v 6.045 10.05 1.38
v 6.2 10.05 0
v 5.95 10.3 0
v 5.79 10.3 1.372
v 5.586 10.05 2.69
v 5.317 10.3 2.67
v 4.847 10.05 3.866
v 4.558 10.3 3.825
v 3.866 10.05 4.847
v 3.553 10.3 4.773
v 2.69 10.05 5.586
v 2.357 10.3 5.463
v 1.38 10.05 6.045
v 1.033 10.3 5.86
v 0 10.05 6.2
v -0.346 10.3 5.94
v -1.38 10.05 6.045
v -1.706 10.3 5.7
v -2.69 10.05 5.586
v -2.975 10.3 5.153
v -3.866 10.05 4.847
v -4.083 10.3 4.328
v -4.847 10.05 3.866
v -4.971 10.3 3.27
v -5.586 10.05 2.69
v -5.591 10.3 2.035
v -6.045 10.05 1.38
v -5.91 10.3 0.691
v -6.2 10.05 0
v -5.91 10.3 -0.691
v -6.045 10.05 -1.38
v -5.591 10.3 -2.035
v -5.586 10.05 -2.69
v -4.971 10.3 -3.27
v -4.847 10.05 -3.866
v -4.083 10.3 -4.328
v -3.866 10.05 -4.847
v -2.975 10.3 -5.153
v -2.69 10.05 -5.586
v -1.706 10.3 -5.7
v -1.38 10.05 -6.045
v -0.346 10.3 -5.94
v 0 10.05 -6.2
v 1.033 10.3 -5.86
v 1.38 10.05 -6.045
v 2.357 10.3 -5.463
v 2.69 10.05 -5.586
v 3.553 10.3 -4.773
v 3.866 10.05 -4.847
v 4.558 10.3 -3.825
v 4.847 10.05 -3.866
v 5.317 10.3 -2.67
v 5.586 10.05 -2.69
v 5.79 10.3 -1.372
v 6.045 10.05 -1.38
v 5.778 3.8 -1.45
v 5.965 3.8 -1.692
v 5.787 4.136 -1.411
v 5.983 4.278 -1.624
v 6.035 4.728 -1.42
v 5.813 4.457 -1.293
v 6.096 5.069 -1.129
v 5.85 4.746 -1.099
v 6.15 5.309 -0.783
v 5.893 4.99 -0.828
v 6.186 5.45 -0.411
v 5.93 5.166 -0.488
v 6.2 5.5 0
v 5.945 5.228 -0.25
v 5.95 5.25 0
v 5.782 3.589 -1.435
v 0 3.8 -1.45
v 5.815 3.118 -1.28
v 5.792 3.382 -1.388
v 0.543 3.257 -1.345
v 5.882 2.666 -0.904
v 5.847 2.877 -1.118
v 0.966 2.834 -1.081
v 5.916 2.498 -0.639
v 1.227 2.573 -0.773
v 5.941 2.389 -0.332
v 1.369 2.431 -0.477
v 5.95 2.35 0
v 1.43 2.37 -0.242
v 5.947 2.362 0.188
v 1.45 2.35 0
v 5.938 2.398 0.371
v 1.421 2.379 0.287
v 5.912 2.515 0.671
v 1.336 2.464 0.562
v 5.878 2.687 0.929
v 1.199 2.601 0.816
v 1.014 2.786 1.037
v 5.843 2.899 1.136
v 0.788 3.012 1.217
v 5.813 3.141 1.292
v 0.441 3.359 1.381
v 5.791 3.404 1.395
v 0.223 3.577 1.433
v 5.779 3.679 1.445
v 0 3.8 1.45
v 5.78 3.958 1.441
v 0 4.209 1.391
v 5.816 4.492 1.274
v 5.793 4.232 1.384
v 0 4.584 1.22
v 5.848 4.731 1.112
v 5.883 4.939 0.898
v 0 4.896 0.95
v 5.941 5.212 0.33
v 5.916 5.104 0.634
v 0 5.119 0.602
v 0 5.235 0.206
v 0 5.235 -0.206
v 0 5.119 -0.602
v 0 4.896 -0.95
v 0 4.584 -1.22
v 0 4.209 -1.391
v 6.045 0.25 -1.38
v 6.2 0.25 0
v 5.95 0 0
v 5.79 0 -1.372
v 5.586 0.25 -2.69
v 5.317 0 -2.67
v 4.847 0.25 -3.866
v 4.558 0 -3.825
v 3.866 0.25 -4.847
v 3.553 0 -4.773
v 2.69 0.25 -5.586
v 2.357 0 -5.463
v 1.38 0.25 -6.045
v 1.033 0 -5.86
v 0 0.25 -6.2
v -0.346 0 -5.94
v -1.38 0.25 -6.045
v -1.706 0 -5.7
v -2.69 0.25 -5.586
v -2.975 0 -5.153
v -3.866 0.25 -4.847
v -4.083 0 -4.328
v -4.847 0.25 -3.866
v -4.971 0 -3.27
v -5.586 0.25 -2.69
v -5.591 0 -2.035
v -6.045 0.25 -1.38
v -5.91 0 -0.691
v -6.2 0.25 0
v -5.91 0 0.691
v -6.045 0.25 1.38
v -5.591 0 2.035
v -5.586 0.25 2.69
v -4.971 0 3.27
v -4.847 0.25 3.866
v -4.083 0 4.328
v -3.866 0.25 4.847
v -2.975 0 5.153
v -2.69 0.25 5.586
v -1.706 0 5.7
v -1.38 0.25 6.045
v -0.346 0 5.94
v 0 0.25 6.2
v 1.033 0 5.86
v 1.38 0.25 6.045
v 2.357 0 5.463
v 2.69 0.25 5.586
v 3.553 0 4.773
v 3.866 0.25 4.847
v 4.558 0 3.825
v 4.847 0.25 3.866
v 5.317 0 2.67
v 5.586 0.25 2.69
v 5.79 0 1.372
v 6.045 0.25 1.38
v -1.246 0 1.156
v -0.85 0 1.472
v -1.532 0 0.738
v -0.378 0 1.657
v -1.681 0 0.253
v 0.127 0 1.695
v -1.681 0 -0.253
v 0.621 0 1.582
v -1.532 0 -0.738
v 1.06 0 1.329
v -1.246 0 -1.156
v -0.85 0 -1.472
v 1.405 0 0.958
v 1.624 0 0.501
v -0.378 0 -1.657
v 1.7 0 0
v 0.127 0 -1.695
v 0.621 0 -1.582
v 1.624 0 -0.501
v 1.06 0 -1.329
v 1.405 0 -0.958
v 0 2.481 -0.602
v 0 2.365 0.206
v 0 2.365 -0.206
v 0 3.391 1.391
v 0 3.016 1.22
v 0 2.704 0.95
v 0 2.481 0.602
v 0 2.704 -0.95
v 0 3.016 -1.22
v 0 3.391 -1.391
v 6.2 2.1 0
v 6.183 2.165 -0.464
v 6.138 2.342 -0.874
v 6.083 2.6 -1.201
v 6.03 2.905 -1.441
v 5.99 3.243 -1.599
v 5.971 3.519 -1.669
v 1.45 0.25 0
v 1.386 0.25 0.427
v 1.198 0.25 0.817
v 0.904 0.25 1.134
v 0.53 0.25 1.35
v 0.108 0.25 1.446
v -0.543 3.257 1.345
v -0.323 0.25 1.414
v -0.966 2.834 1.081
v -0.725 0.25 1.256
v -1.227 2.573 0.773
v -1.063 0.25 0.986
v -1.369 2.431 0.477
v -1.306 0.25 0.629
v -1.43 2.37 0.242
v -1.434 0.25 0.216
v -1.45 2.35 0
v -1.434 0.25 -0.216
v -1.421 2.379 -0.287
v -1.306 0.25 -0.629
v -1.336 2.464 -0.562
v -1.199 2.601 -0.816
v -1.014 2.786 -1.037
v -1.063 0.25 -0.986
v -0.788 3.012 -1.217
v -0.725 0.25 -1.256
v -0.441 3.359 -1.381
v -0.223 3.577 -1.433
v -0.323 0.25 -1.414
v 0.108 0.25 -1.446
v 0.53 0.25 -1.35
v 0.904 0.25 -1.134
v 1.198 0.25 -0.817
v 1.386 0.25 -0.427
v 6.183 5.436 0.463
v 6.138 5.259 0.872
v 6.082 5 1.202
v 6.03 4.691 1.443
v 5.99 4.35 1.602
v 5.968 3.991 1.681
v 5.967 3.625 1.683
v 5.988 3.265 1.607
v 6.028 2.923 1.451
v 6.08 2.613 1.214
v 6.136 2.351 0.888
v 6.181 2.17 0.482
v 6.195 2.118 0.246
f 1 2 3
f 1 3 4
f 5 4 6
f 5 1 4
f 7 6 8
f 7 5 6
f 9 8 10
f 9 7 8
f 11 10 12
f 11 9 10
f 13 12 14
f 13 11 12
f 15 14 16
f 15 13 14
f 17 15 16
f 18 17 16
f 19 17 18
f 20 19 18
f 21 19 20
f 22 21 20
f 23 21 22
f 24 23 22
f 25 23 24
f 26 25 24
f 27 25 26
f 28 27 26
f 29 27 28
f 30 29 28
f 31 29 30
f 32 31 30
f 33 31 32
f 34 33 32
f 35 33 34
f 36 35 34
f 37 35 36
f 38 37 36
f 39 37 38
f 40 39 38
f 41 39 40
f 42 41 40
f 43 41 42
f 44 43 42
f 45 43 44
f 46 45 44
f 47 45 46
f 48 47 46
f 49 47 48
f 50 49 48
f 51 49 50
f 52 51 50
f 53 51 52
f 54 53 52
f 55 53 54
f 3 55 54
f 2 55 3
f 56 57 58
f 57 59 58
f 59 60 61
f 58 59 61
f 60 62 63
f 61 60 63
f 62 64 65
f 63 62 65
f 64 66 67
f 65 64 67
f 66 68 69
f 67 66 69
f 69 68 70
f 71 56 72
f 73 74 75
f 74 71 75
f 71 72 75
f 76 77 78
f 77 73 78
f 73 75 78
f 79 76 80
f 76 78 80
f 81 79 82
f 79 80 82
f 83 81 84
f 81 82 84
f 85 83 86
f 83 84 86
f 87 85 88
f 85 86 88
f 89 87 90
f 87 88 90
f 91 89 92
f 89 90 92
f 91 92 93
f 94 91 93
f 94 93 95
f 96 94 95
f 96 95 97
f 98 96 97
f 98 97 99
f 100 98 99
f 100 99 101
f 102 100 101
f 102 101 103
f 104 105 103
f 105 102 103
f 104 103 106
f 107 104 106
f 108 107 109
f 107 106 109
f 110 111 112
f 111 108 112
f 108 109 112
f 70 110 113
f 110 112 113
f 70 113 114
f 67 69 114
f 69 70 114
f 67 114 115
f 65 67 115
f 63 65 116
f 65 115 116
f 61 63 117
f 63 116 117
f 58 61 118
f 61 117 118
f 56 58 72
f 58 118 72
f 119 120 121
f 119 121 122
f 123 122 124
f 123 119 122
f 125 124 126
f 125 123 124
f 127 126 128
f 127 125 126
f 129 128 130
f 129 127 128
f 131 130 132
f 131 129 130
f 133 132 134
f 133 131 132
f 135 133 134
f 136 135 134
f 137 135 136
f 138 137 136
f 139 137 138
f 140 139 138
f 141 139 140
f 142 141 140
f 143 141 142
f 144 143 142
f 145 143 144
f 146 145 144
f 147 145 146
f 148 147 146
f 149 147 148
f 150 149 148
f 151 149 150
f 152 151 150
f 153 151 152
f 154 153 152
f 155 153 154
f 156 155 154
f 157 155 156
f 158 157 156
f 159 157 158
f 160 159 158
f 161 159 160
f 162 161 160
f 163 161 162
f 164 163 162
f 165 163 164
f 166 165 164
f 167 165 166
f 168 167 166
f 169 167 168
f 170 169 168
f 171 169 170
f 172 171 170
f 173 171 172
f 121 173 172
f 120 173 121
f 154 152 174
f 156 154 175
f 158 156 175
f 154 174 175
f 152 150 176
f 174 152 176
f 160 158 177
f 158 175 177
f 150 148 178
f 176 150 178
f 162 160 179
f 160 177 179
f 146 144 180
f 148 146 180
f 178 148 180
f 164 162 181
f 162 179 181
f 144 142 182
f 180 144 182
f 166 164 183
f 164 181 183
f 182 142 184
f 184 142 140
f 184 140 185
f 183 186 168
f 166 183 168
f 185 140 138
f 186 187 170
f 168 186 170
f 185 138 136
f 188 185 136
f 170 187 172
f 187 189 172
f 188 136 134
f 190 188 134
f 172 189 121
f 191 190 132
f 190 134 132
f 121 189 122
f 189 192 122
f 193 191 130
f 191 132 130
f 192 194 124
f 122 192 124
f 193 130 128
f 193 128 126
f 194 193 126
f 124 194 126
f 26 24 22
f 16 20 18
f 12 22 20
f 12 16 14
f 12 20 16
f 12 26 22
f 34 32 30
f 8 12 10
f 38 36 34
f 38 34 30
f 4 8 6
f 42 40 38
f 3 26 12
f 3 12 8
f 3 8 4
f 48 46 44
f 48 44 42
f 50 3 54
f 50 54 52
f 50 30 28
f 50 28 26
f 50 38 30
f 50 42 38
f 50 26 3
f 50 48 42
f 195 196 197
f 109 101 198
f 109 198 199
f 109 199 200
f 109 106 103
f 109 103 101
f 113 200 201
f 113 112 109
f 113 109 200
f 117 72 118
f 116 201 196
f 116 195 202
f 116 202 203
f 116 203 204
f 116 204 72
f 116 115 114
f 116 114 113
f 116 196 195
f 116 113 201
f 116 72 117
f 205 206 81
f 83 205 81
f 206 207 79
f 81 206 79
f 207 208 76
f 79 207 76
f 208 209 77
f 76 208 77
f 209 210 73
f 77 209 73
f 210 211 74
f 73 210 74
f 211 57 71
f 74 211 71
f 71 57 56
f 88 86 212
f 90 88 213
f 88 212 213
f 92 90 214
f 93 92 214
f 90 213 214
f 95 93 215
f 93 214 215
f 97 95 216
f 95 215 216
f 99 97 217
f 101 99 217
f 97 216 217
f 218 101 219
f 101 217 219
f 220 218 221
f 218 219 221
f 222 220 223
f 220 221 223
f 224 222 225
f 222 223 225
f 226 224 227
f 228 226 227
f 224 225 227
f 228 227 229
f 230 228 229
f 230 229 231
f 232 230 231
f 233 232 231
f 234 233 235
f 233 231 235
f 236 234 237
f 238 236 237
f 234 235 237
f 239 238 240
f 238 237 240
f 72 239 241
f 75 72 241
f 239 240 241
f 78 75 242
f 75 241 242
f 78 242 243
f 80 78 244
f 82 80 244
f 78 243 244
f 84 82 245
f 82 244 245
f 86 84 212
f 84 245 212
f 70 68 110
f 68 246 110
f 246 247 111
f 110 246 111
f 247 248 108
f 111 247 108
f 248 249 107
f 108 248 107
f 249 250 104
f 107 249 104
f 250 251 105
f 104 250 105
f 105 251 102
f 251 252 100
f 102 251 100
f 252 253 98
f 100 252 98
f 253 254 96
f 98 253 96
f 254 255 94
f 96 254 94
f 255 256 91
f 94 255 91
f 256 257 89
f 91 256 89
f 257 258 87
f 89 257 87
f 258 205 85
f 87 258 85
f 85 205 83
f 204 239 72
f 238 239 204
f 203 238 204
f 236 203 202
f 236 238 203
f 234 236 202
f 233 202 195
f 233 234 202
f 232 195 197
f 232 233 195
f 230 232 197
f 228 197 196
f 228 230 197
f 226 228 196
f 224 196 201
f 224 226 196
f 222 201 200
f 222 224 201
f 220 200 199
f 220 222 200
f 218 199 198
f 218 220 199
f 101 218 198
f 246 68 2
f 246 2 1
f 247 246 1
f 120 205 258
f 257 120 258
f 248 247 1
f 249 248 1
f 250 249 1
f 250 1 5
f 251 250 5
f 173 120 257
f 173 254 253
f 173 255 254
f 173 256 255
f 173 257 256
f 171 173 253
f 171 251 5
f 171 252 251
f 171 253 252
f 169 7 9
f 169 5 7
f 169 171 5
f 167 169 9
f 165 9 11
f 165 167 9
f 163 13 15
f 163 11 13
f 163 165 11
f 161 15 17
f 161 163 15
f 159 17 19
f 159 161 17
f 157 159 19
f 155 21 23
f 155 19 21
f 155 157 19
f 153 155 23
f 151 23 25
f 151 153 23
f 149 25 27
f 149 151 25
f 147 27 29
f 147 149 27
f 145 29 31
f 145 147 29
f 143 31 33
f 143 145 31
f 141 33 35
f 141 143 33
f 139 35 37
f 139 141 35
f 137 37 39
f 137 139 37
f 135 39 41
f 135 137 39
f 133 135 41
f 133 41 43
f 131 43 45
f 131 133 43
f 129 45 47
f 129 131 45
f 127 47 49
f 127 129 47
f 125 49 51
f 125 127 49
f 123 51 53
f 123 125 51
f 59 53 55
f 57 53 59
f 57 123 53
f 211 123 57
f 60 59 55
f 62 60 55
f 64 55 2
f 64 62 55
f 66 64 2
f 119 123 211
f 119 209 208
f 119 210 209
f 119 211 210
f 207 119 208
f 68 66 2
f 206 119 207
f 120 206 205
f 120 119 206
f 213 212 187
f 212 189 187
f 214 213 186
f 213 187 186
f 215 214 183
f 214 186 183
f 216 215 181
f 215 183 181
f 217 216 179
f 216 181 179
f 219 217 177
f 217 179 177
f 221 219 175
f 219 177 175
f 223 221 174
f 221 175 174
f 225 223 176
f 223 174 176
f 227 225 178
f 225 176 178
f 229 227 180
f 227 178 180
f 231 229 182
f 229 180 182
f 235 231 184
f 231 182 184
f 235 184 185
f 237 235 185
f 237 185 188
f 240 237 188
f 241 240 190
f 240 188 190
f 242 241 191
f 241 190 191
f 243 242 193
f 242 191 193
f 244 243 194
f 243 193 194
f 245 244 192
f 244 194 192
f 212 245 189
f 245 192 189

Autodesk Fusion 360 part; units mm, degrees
sketch "Sketch1" plane through (0, 0, 0) normal (0, 1, 0) x (1, 0, 0) in component "Oil Drop Cap"
  circle A0 centre (0, 0) radius 6.2
  circle A1 centre (0, 0) radius 1.45
  dimension "d5" = 12.4
  dimension "d6" = 2.9
sketch "Sketch2" plane through (0, 0, 0) normal (1, 0, 0) x (0, 0, -1) in component "Oil Drop Cap"
  line L0 (0, 0) -> (0, 3.8) construction
  circle A0 centre (0, 3.8) radius 1.45
  dimension "d7" = 3.8
  dimension "d8" = 2.9
extrude "Extrude1" add sketch "Sketch1" along normal blind 10.3 contours A0 | A1 in component "Oil Drop Cap"
extrude "Extrude2" cut sketch "Sketch2" along normal up to surface end surface at (6.1923, 6.8667, 0.309) in component "Oil Drop Cap"
extrude "Extrude3" cut sketch "Sketch1" along normal up to surface contours A1 end surface at (2.0667, 5.25, 0) in component "Oil Drop Cap"
chamfer "Chamfer1" distance 0.25 angle 45 2 faces at (1.6068, 10.3, -0.7965) (4.5882, 0, 0.3801) in component "Oil Drop Cap"
chamfer "Chamfer1" distance 0.25 angle 45 1 edges at (6.0281, 3.8, 1.45) in component "Oil Drop Cap"
component "Oil Drop Cap" placed x (1, 0, 0) y (0, 1, 0) z (0, 0, 1) at (0, 0, 0)
equation "CylinderDiameter = 12.4 mm"
equation "CylinderHeight = 10.3 mm"
equation "HoleDiameter = 2.9 mm"
equation "HoleHeight = 3.8 mm"
equation "d5 = CylinderDiameter"
equation "d6 = HoleDiameter"
equation "d7 = HoleHeight"
equation "d8 = HoleDiameter"
equation "d9 = CylinderHeight"
